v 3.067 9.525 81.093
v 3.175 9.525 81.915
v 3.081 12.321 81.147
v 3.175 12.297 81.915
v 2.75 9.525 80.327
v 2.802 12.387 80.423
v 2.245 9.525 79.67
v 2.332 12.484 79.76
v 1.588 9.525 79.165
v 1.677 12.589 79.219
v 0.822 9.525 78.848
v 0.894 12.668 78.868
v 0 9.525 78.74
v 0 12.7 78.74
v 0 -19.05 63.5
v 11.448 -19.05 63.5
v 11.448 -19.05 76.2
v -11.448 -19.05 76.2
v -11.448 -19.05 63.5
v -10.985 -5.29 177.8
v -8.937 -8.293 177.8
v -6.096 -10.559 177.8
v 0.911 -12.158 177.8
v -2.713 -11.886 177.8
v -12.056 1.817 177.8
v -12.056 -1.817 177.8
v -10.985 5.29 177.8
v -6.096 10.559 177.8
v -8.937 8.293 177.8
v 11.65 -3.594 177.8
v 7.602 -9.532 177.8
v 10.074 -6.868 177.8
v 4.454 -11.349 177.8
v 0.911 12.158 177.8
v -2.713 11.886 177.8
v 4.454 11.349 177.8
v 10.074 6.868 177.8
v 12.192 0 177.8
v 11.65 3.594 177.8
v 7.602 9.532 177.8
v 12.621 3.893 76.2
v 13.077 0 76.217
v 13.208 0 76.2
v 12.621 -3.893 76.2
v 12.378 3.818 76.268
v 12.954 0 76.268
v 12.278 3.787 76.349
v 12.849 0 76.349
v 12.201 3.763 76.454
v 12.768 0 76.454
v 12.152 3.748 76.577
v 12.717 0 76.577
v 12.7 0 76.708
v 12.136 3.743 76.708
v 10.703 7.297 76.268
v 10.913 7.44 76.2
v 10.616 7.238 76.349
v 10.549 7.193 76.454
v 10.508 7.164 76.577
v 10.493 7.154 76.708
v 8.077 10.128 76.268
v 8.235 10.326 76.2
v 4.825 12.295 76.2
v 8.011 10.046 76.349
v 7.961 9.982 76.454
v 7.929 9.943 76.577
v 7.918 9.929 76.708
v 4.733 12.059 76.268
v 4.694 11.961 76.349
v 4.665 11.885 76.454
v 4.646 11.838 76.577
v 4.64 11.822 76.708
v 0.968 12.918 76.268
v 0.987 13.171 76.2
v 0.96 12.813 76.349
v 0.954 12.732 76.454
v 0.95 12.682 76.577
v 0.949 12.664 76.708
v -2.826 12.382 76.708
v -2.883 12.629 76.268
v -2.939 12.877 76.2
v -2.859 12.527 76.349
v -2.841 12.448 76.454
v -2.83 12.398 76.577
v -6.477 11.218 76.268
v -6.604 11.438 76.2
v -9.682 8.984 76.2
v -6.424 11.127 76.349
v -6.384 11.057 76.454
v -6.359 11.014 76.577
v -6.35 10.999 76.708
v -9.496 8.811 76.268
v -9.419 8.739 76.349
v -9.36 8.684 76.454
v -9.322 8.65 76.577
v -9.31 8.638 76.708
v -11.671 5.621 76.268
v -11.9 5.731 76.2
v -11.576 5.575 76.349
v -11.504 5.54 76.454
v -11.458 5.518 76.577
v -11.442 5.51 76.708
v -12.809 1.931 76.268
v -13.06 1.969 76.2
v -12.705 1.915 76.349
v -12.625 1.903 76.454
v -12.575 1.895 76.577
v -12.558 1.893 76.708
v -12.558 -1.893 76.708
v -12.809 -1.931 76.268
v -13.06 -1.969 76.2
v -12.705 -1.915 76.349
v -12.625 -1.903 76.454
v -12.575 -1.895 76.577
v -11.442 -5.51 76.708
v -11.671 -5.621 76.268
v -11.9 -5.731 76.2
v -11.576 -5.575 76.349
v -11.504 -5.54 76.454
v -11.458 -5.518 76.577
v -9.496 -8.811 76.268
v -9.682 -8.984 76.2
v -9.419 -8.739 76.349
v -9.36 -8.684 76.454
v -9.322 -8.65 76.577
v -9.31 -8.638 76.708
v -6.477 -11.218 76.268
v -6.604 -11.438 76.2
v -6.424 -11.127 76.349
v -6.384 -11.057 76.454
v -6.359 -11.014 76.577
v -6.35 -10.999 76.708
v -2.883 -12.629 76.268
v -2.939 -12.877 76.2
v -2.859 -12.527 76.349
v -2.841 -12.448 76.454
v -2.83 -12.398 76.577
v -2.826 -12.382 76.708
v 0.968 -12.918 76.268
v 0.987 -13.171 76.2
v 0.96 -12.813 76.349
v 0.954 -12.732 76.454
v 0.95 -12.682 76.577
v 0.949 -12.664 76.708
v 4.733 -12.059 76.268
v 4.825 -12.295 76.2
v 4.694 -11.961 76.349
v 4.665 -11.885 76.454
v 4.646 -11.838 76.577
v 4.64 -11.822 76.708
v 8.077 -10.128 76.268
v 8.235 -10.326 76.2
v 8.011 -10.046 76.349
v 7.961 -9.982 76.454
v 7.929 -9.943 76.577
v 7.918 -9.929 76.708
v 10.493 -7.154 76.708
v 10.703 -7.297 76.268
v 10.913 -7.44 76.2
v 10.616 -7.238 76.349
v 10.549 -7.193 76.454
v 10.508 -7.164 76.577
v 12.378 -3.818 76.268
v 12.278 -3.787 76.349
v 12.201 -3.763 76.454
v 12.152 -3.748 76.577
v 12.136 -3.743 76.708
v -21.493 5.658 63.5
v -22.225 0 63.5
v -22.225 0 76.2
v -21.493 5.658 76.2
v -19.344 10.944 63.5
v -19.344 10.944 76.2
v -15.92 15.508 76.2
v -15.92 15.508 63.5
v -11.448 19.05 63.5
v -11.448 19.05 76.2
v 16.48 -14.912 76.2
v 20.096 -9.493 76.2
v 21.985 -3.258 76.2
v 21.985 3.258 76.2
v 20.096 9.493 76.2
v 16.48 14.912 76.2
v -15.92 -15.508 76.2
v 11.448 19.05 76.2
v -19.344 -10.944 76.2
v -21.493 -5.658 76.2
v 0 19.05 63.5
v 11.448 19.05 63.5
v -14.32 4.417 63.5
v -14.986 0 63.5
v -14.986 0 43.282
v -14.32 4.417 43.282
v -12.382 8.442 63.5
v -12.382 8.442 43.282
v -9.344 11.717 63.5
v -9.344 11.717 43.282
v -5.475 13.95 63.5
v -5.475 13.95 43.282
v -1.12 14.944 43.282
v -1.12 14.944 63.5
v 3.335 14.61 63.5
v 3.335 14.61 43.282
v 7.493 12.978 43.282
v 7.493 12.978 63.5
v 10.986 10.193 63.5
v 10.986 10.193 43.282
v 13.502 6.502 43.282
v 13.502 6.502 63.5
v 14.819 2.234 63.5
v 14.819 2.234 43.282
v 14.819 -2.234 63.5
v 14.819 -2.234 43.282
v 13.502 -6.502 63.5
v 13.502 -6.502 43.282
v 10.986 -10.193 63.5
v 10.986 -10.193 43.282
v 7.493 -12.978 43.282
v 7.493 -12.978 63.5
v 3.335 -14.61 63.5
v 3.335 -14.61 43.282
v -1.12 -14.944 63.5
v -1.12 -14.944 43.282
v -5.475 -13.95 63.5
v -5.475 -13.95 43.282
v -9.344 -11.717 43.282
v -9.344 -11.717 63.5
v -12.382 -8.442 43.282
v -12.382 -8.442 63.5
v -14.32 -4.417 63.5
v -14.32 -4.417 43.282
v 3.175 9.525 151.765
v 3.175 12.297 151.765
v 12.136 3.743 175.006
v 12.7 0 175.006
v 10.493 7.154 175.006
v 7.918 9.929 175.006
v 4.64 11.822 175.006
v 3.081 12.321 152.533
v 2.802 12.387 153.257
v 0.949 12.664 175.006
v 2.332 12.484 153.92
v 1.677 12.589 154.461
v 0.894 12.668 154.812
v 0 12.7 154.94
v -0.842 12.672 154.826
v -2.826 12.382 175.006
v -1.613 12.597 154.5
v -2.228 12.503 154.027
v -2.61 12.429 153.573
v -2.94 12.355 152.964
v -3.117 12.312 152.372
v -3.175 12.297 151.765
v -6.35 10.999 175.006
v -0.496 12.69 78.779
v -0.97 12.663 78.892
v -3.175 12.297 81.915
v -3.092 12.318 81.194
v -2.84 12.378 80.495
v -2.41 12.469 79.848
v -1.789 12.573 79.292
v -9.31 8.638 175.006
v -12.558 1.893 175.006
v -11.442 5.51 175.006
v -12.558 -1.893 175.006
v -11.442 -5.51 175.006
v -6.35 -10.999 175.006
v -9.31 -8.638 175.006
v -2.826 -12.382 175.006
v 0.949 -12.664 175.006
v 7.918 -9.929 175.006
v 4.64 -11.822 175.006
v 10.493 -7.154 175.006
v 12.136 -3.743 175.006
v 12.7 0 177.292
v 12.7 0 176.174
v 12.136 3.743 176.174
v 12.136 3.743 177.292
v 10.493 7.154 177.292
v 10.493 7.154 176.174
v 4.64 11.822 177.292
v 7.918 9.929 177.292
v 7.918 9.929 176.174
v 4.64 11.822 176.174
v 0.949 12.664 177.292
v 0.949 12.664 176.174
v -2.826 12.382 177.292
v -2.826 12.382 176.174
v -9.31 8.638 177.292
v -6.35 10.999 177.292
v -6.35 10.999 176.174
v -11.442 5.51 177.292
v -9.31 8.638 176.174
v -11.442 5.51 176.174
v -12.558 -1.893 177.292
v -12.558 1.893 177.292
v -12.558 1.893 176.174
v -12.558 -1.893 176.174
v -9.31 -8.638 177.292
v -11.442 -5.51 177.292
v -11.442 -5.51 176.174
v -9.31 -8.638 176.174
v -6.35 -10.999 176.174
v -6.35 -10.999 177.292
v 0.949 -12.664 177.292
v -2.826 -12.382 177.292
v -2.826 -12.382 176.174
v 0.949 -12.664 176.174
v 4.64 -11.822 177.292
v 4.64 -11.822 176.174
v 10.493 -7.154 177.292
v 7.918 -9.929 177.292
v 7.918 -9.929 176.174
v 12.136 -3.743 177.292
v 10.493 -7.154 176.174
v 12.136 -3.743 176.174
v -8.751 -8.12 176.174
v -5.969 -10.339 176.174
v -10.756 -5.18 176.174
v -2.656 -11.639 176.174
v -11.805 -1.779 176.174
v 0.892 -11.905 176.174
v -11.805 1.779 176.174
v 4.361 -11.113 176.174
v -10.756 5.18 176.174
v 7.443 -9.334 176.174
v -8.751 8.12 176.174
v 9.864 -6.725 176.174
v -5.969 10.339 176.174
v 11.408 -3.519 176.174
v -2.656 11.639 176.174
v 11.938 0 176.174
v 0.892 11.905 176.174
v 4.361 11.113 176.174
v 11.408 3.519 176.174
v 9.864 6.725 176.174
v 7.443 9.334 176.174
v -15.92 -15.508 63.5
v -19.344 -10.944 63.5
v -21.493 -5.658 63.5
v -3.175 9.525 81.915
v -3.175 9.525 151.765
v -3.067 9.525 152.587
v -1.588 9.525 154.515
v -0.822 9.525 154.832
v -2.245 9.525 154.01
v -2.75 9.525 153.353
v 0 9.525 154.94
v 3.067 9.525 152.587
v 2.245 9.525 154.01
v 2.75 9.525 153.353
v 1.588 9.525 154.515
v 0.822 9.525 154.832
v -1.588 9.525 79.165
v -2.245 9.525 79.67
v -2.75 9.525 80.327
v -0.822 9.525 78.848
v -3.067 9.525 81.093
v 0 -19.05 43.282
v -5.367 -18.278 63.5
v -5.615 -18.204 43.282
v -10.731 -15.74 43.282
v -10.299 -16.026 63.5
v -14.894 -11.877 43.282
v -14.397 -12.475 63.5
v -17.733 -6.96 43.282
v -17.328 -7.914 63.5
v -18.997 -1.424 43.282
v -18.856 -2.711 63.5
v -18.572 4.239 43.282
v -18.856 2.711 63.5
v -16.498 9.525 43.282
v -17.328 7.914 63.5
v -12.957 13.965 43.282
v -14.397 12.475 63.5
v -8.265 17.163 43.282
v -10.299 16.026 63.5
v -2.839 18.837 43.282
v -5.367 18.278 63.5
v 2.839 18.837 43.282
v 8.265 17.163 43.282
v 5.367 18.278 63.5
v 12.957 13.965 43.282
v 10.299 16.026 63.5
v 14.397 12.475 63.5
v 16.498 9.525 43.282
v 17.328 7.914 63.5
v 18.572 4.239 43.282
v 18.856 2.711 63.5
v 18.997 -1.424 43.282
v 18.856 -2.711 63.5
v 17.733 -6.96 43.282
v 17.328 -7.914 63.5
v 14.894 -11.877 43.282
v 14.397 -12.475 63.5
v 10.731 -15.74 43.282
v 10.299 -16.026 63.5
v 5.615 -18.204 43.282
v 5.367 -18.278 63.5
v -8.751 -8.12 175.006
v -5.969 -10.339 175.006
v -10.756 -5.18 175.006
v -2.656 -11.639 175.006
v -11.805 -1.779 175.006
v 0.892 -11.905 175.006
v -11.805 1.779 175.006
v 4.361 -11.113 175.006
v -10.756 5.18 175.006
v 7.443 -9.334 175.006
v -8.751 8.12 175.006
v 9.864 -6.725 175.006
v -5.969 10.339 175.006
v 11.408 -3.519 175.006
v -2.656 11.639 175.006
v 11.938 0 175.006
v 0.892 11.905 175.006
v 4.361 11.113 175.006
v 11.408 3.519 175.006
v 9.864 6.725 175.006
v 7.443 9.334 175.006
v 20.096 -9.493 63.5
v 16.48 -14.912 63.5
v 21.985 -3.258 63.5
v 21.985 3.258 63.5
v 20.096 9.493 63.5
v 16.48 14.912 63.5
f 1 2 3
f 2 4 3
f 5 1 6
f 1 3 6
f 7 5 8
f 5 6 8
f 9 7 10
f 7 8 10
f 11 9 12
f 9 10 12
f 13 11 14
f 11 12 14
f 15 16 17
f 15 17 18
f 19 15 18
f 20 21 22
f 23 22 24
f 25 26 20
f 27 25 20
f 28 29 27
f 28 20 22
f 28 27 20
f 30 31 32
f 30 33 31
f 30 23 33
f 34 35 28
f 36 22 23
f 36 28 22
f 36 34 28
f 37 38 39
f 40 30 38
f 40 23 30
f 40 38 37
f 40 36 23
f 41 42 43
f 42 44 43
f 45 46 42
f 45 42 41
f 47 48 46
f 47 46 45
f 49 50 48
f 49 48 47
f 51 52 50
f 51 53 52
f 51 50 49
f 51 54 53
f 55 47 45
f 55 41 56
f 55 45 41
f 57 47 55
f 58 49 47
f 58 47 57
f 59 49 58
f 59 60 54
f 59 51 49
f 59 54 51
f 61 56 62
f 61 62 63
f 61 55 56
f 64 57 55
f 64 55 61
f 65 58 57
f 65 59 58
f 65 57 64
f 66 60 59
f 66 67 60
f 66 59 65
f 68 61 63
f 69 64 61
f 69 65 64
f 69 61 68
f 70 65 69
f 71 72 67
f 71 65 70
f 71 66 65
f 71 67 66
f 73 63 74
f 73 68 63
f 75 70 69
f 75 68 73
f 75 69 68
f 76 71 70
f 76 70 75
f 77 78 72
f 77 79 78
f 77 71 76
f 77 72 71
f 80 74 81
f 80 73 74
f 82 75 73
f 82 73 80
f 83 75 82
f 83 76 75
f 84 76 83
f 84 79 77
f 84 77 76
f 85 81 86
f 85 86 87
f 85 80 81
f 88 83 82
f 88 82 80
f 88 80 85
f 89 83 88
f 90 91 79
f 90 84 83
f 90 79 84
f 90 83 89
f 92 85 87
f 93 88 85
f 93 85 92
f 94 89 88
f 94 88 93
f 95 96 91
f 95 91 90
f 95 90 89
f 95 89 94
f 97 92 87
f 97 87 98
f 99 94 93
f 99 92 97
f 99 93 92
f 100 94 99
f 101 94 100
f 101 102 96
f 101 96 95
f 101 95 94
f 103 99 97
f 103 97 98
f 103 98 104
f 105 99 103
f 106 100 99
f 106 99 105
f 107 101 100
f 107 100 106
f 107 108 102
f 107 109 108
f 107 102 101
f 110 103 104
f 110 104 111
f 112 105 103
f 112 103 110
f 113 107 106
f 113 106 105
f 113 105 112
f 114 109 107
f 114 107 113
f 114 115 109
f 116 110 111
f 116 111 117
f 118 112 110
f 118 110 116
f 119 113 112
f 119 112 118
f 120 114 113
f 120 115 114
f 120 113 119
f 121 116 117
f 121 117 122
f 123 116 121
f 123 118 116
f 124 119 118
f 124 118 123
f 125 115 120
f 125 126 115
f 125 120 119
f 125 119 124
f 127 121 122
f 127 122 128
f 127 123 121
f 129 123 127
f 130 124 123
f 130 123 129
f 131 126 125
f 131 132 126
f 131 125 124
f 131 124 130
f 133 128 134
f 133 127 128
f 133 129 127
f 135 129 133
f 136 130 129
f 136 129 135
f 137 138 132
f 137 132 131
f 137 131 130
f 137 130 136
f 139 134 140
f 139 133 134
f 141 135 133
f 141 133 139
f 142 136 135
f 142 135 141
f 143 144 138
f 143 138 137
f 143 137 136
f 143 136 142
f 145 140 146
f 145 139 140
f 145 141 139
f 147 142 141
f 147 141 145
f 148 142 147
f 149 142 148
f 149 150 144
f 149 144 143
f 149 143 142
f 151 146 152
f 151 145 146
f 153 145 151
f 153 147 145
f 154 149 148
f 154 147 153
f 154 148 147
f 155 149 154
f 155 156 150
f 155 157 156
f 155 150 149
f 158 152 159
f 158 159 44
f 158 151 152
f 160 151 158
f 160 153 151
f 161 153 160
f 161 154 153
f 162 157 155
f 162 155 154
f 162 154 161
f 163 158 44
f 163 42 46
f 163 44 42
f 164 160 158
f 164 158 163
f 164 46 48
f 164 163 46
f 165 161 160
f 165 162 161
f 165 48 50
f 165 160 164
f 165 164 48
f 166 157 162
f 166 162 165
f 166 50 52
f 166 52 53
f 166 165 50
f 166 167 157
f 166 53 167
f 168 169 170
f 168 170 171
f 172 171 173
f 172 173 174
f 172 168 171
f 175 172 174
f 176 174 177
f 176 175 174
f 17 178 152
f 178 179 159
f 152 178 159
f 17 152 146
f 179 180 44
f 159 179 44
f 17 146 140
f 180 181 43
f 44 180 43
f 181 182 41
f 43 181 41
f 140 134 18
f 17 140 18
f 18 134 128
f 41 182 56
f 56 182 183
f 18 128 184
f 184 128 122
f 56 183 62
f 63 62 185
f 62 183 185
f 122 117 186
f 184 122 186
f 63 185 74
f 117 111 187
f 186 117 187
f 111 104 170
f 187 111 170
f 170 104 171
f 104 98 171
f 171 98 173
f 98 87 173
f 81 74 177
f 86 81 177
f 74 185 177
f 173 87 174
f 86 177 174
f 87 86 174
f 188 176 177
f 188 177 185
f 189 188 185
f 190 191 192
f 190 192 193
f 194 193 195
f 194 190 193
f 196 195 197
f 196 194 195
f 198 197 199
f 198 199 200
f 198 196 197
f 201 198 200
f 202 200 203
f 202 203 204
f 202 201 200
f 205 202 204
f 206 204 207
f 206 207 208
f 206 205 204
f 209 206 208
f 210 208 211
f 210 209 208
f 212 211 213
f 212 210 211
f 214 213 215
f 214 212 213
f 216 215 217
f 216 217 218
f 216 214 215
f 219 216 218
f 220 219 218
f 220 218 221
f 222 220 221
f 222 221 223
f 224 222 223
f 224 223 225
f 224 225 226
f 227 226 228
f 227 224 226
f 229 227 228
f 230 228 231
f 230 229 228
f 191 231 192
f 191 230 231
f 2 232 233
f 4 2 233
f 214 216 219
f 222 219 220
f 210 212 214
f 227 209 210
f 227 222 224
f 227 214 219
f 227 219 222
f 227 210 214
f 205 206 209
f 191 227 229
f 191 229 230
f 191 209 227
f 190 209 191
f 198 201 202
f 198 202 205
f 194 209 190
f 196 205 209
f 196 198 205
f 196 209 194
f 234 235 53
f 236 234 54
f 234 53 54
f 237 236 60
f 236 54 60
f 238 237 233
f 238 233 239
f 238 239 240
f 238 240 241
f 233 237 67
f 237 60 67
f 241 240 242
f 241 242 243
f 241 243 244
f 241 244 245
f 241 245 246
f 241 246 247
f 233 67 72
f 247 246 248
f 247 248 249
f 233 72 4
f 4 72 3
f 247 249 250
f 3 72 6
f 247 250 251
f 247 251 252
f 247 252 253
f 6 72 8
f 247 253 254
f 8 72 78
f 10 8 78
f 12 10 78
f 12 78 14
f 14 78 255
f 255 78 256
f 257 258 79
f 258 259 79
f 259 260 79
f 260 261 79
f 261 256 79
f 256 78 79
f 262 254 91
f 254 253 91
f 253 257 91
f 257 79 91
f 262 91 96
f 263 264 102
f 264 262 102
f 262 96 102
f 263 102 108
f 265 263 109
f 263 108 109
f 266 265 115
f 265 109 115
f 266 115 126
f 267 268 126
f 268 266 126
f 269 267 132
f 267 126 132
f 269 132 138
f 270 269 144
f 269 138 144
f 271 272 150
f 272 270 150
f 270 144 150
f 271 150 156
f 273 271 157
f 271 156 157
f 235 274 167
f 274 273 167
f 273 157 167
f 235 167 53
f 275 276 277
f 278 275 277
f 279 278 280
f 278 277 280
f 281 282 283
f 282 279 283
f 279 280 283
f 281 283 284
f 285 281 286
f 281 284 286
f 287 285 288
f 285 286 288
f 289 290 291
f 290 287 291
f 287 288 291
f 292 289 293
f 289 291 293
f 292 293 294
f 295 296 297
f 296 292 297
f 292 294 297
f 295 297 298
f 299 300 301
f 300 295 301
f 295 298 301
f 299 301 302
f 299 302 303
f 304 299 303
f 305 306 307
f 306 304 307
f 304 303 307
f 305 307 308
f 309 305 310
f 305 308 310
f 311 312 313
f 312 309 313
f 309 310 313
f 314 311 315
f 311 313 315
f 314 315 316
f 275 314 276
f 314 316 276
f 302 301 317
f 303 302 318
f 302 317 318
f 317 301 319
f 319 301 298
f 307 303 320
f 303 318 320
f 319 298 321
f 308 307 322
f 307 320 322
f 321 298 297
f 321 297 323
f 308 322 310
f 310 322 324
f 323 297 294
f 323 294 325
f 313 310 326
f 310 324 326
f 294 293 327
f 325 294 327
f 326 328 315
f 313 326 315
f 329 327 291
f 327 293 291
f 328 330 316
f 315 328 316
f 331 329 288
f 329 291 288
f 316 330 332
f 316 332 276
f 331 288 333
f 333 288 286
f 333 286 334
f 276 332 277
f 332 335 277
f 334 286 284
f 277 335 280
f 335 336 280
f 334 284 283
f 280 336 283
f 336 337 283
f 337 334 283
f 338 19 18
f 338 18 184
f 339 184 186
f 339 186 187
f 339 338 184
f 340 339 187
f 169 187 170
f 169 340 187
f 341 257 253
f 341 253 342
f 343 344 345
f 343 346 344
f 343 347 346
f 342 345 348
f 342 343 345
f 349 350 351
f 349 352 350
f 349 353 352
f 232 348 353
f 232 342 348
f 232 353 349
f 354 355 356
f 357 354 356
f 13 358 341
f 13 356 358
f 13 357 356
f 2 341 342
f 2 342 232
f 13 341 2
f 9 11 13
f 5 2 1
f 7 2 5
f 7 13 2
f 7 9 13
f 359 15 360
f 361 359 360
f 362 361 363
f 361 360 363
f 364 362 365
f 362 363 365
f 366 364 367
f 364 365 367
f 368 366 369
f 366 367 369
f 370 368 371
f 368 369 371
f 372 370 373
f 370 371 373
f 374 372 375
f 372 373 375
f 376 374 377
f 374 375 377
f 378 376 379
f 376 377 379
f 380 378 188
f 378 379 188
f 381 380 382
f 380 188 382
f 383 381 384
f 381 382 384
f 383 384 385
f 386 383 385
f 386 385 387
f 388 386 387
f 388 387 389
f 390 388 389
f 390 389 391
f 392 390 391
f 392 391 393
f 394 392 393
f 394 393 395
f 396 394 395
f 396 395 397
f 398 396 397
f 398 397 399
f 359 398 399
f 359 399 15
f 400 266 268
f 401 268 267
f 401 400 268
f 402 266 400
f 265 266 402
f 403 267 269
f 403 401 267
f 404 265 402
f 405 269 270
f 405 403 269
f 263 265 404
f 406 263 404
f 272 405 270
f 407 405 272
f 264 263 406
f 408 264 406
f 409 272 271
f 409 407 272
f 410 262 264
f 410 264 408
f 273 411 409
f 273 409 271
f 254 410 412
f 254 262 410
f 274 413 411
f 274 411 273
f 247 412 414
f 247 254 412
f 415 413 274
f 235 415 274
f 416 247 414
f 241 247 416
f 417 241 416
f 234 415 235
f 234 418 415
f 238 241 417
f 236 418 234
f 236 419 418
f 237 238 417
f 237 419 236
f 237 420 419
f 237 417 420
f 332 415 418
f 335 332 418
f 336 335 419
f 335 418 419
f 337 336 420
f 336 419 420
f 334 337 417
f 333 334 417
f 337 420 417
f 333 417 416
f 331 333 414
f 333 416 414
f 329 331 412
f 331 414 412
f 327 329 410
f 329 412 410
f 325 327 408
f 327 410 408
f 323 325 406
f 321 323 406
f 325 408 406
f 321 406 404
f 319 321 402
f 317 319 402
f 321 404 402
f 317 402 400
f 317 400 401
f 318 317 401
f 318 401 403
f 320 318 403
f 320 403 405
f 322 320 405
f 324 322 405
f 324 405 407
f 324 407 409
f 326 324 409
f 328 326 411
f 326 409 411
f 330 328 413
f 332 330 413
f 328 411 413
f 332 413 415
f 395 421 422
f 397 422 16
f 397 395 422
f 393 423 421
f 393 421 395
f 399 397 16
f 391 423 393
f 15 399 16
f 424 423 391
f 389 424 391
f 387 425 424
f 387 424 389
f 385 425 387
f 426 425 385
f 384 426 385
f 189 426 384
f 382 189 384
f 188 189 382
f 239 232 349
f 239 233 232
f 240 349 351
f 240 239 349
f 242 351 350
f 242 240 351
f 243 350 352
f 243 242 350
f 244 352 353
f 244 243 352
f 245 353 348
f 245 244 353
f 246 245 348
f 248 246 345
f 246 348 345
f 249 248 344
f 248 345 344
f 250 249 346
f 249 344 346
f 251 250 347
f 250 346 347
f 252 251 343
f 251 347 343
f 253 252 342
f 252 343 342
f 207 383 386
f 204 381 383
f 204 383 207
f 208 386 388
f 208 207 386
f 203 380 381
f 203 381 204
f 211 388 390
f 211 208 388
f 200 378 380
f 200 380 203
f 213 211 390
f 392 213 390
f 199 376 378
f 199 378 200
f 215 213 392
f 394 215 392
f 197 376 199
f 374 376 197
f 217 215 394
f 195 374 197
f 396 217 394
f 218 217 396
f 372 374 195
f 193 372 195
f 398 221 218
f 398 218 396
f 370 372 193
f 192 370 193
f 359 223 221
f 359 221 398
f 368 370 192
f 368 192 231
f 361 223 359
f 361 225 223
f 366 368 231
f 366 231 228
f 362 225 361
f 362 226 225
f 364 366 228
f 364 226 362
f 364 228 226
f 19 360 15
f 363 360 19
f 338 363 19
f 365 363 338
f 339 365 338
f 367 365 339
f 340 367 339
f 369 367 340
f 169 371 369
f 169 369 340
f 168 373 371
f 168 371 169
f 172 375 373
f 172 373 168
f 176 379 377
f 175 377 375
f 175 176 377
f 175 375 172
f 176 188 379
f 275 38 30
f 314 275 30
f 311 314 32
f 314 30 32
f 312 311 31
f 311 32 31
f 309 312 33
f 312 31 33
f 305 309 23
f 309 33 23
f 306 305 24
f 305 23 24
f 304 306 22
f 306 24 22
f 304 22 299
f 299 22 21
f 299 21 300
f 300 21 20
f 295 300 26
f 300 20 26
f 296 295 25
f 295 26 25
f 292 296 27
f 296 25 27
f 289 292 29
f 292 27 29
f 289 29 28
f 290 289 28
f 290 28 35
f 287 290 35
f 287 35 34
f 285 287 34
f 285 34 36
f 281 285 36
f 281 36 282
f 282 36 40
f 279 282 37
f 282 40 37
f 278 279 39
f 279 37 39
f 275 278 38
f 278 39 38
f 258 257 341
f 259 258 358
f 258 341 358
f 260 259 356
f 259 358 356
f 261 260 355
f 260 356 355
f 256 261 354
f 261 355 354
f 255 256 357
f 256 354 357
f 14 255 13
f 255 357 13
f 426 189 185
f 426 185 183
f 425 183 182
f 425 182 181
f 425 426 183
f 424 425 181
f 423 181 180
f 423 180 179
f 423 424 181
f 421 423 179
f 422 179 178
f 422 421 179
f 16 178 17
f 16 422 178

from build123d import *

# Parameters (mm, degrees)
SKETCH1_R           = 19.05
SKETCH1_R_2         = 13.9954
BOSS_EXTRUDE1_DEPTH = 63.5
SKETCH2_R           = 19.05
BOSS_EXTRUDE2_DEPTH = 12.7
SKETCH3_R           = 12.7
BOSS_EXTRUDE3_DEPTH = 127
FILLET1_R           = 0.508
CHAMFER1_SIZE       = 1.27
CUT_EXTRUDE1_DEPTH  = 76.2
FILLET2_R           = 3.175
BOSS_EXTRUDE4_DEPTH = 76.2
BOSS_EXTRUDE5_START = 63.5
SKETCH6_R           = 13.9954
BOSS_EXTRUDE5_DEPTH = 63.5
SKETCH7_R           = 25.219402827
SKETCH7_R_2         = 12.7
CUT_EXTRUDE2_DEPTH  = 63.5
SKETCH8_R           = 14.2875
CUT_EXTRUDE3_DEPTH  = 19.05
SKETCH9_W           = 6.35
SKETCH9_H           = 41.275
CUT_EXTRUDE4_DEPTH  = 25.4
FILLET3_R           = 3.175
SKETCH10_R          = 33.957183176
CUT_EXTRUDE5_DEPTH  = 44.45
SKETCH11_R          = 19.05
SKETCH11_R_2        = 14.986
BOSS_EXTRUDE6_DEPTH = 20.2184
SKETCH12_R          = 18.486840379
CUT_EXTRUDE6_DEPTH  = 25.4
SKETCH13_R          = 16.938517856
SKETCH13_R_2        = 11.938
CUT_EXTRUDE7_DEPTH  = 1.1684
CHAMFER3_SIZE       = 0.508


with BuildPart() as part:
    # Sketch1 → Boss-Extrude1 (new body)
    with BuildSketch(Plane.XY):
        Circle(SKETCH1_R)
        Circle(SKETCH1_R_2, mode=Mode.SUBTRACT)
    extrude(amount=BOSS_EXTRUDE1_DEPTH)

    # Sketch2 → Boss-Extrude2 (add)
    with BuildSketch(Plane.XY.offset(63.5)):
        Circle(SKETCH2_R)
    extrude(amount=BOSS_EXTRUDE2_DEPTH)

    # Sketch3 → Boss-Extrude3 (add)
    with BuildSketch(Plane.XY.offset(76.2)):
        Circle(SKETCH3_R)
    extrude(amount=BOSS_EXTRUDE3_DEPTH)

    # Fillet1
    fillet1_edges = [part.edges().sort_by_distance(p)[0] for p in [
        (-12.7, 0, 76.2),
    ]]
    fillet(fillet1_edges, radius=FILLET1_R)

    # Chamfer1
    chamfer1_edges = [part.edges().sort_by_distance(p)[0] for p in [
        (-12.7, 0, 203.2),
    ]]
    chamfer(chamfer1_edges, length=CHAMFER1_SIZE)

    # Sketch4 → Cut-Extrude1 (cut)
    with BuildSketch(Plane.XY.offset(78.74)):
        with BuildLine():
            Line((-3.175, 9.525), (3.175, 9.525))
            Line((3.175, 9.525), (3.175, 12.296722124))
            ThreePointArc((3.175, 12.296722124), (0, 12.7), (-3.175, 12.296722124))
            Line((-3.175, 12.296722124), (-3.175, 9.525))
        make_face()
    extrude(amount=CUT_EXTRUDE1_DEPTH, mode=Mode.SUBTRACT)

    # Fillet2
    fillet2_edges = [part.edges().sort_by_distance(p)[0] for p in [
        (3.175, 10.910861062, 154.94),
        (-3.175, 10.910861062, 154.94),
        (3.175, 10.910861062, 78.74),
        (-3.175, 10.910861062, 78.74),
    ]]
    fillet(fillet2_edges, radius=FILLET2_R - 0.0001)  # a hair under: the kernel refuses the full size

    # Sketch5 → Boss-Extrude4 (add)
    with BuildSketch(Plane(origin=(0, 0, 0), x_dir=(-1, 0, 0), z_dir=(0, 0, -1))):
        with BuildLine():
            Line((-4.6e-08, 19.05), (-11.4476253, 19.05))
            ThreePointArc((-11.4476253, 19.05), (-22.225, 0), (-11.4476253, -19.05))
            Line((-11.4476253, -19.05), (1.9e-08, -19.05))
            ThreePointArc((1.9e-08, -19.05), (-19.05, -3.2e-08), (-4.6e-08, 19.05))
        make_face()
        with BuildLine():
            Line((11.4476253, 19.05), (-4.6e-08, 19.05))
            ThreePointArc((-4.6e-08, 19.05), (13.470384166, 13.470384198), (19.05, 0))
            ThreePointArc((19.05, 0), (13.470384188, -13.470384175), (1.9e-08, -19.05))
            Line((1.9e-08, -19.05), (11.4476253, -19.05))
            ThreePointArc((11.4476253, -19.05), (19.343915029, -10.943654616), (22.225, 0))
            ThreePointArc((22.225, 0), (19.343915029, 10.943654616), (11.4476253, 19.05))
        make_face()
    extrude(amount=-BOSS_EXTRUDE4_DEPTH)

    # Sketch6 → Boss-Extrude5 (add)
    with BuildSketch(Plane(origin=(0, 0, 63.5), x_dir=(-1, 0, 0), z_dir=(0, 0, -1)).offset(BOSS_EXTRUDE5_START)):
        Circle(SKETCH6_R)
    extrude(amount=-BOSS_EXTRUDE5_DEPTH)

    # Sketch7 → Cut-Extrude2 (cut)
    with BuildSketch(Plane(origin=(0, 0, 0), x_dir=(-1, 0, 0), z_dir=(0, 0, -1))):
        Circle(SKETCH7_R)
        with Locations(Location((0, 0, 0), (0, 0, 180))):
            Circle(SKETCH7_R_2, mode=Mode.SUBTRACT)
    extrude(amount=-CUT_EXTRUDE2_DEPTH, mode=Mode.SUBTRACT)

    # Sketch8 → Cut-Extrude3 (cut)
    with BuildSketch(Plane(origin=(0, 0, 0), x_dir=(-1, 0, 0), z_dir=(0, 0, -1))):
        Circle(SKETCH8_R)
    extrude(amount=-CUT_EXTRUDE3_DEPTH, mode=Mode.SUBTRACT)

    # Sketch9 → Cut-Extrude4 (cut)
    with BuildSketch(Plane(origin=(0, 9.525, 0), x_dir=(1, 0, 0), z_dir=(0, 1, 0))):
        with Locations((0, -39.6875)):
            Rectangle(SKETCH9_W, SKETCH9_H)
    extrude(amount=CUT_EXTRUDE4_DEPTH, mode=Mode.SUBTRACT)

    # Fillet3
    fillet3_edges = [part.edges().sort_by_distance(p)[0] for p in [
        (-3.175, 10.910861062, 60.325),
        (3.175, 10.910861062, 60.325),
    ]]
    fillet(fillet3_edges, radius=FILLET3_R - 0.0001)  # a hair under: the kernel refuses the full size

    # Sketch10 → Cut-Extrude5 (cut)
    with BuildSketch(Plane(origin=(0, 0, 19.05), x_dir=(-1, 0, 0), z_dir=(0, 0, -1))):
        Circle(SKETCH10_R)
    extrude(amount=-CUT_EXTRUDE5_DEPTH, mode=Mode.SUBTRACT)

    # Sketch11 → Boss-Extrude6 (add)
    with BuildSketch(Plane(origin=(0, 0, 63.5), x_dir=(-1, 0, 0), z_dir=(0, 0, -1))):
        with Locations(Location((0, 0, 0), (0, 0, 270))):
            Circle(SKETCH11_R)
        Circle(SKETCH11_R_2, mode=Mode.SUBTRACT)
    extrude(amount=BOSS_EXTRUDE6_DEPTH)

    # Sketch12 → Cut-Extrude6 (cut)
    with BuildSketch(Plane.XY.offset(203.2)):
        Circle(SKETCH12_R)
    extrude(amount=-CUT_EXTRUDE6_DEPTH, mode=Mode.SUBTRACT)

    # Sketch13 → Cut-Extrude7 (cut)
    with BuildSketch(Plane.XY.offset(175.006)):
        Circle(SKETCH13_R)
        Circle(SKETCH13_R_2, mode=Mode.SUBTRACT)
    extrude(amount=CUT_EXTRUDE7_DEPTH, mode=Mode.SUBTRACT)

    # Chamfer3
    chamfer3_edges = [part.edges().sort_by_distance(p)[0] for p in [
        (-12.7, 0, 177.8),
    ]]
    chamfer(chamfer3_edges, length=CHAMFER3_SIZE)


solid = part.part
